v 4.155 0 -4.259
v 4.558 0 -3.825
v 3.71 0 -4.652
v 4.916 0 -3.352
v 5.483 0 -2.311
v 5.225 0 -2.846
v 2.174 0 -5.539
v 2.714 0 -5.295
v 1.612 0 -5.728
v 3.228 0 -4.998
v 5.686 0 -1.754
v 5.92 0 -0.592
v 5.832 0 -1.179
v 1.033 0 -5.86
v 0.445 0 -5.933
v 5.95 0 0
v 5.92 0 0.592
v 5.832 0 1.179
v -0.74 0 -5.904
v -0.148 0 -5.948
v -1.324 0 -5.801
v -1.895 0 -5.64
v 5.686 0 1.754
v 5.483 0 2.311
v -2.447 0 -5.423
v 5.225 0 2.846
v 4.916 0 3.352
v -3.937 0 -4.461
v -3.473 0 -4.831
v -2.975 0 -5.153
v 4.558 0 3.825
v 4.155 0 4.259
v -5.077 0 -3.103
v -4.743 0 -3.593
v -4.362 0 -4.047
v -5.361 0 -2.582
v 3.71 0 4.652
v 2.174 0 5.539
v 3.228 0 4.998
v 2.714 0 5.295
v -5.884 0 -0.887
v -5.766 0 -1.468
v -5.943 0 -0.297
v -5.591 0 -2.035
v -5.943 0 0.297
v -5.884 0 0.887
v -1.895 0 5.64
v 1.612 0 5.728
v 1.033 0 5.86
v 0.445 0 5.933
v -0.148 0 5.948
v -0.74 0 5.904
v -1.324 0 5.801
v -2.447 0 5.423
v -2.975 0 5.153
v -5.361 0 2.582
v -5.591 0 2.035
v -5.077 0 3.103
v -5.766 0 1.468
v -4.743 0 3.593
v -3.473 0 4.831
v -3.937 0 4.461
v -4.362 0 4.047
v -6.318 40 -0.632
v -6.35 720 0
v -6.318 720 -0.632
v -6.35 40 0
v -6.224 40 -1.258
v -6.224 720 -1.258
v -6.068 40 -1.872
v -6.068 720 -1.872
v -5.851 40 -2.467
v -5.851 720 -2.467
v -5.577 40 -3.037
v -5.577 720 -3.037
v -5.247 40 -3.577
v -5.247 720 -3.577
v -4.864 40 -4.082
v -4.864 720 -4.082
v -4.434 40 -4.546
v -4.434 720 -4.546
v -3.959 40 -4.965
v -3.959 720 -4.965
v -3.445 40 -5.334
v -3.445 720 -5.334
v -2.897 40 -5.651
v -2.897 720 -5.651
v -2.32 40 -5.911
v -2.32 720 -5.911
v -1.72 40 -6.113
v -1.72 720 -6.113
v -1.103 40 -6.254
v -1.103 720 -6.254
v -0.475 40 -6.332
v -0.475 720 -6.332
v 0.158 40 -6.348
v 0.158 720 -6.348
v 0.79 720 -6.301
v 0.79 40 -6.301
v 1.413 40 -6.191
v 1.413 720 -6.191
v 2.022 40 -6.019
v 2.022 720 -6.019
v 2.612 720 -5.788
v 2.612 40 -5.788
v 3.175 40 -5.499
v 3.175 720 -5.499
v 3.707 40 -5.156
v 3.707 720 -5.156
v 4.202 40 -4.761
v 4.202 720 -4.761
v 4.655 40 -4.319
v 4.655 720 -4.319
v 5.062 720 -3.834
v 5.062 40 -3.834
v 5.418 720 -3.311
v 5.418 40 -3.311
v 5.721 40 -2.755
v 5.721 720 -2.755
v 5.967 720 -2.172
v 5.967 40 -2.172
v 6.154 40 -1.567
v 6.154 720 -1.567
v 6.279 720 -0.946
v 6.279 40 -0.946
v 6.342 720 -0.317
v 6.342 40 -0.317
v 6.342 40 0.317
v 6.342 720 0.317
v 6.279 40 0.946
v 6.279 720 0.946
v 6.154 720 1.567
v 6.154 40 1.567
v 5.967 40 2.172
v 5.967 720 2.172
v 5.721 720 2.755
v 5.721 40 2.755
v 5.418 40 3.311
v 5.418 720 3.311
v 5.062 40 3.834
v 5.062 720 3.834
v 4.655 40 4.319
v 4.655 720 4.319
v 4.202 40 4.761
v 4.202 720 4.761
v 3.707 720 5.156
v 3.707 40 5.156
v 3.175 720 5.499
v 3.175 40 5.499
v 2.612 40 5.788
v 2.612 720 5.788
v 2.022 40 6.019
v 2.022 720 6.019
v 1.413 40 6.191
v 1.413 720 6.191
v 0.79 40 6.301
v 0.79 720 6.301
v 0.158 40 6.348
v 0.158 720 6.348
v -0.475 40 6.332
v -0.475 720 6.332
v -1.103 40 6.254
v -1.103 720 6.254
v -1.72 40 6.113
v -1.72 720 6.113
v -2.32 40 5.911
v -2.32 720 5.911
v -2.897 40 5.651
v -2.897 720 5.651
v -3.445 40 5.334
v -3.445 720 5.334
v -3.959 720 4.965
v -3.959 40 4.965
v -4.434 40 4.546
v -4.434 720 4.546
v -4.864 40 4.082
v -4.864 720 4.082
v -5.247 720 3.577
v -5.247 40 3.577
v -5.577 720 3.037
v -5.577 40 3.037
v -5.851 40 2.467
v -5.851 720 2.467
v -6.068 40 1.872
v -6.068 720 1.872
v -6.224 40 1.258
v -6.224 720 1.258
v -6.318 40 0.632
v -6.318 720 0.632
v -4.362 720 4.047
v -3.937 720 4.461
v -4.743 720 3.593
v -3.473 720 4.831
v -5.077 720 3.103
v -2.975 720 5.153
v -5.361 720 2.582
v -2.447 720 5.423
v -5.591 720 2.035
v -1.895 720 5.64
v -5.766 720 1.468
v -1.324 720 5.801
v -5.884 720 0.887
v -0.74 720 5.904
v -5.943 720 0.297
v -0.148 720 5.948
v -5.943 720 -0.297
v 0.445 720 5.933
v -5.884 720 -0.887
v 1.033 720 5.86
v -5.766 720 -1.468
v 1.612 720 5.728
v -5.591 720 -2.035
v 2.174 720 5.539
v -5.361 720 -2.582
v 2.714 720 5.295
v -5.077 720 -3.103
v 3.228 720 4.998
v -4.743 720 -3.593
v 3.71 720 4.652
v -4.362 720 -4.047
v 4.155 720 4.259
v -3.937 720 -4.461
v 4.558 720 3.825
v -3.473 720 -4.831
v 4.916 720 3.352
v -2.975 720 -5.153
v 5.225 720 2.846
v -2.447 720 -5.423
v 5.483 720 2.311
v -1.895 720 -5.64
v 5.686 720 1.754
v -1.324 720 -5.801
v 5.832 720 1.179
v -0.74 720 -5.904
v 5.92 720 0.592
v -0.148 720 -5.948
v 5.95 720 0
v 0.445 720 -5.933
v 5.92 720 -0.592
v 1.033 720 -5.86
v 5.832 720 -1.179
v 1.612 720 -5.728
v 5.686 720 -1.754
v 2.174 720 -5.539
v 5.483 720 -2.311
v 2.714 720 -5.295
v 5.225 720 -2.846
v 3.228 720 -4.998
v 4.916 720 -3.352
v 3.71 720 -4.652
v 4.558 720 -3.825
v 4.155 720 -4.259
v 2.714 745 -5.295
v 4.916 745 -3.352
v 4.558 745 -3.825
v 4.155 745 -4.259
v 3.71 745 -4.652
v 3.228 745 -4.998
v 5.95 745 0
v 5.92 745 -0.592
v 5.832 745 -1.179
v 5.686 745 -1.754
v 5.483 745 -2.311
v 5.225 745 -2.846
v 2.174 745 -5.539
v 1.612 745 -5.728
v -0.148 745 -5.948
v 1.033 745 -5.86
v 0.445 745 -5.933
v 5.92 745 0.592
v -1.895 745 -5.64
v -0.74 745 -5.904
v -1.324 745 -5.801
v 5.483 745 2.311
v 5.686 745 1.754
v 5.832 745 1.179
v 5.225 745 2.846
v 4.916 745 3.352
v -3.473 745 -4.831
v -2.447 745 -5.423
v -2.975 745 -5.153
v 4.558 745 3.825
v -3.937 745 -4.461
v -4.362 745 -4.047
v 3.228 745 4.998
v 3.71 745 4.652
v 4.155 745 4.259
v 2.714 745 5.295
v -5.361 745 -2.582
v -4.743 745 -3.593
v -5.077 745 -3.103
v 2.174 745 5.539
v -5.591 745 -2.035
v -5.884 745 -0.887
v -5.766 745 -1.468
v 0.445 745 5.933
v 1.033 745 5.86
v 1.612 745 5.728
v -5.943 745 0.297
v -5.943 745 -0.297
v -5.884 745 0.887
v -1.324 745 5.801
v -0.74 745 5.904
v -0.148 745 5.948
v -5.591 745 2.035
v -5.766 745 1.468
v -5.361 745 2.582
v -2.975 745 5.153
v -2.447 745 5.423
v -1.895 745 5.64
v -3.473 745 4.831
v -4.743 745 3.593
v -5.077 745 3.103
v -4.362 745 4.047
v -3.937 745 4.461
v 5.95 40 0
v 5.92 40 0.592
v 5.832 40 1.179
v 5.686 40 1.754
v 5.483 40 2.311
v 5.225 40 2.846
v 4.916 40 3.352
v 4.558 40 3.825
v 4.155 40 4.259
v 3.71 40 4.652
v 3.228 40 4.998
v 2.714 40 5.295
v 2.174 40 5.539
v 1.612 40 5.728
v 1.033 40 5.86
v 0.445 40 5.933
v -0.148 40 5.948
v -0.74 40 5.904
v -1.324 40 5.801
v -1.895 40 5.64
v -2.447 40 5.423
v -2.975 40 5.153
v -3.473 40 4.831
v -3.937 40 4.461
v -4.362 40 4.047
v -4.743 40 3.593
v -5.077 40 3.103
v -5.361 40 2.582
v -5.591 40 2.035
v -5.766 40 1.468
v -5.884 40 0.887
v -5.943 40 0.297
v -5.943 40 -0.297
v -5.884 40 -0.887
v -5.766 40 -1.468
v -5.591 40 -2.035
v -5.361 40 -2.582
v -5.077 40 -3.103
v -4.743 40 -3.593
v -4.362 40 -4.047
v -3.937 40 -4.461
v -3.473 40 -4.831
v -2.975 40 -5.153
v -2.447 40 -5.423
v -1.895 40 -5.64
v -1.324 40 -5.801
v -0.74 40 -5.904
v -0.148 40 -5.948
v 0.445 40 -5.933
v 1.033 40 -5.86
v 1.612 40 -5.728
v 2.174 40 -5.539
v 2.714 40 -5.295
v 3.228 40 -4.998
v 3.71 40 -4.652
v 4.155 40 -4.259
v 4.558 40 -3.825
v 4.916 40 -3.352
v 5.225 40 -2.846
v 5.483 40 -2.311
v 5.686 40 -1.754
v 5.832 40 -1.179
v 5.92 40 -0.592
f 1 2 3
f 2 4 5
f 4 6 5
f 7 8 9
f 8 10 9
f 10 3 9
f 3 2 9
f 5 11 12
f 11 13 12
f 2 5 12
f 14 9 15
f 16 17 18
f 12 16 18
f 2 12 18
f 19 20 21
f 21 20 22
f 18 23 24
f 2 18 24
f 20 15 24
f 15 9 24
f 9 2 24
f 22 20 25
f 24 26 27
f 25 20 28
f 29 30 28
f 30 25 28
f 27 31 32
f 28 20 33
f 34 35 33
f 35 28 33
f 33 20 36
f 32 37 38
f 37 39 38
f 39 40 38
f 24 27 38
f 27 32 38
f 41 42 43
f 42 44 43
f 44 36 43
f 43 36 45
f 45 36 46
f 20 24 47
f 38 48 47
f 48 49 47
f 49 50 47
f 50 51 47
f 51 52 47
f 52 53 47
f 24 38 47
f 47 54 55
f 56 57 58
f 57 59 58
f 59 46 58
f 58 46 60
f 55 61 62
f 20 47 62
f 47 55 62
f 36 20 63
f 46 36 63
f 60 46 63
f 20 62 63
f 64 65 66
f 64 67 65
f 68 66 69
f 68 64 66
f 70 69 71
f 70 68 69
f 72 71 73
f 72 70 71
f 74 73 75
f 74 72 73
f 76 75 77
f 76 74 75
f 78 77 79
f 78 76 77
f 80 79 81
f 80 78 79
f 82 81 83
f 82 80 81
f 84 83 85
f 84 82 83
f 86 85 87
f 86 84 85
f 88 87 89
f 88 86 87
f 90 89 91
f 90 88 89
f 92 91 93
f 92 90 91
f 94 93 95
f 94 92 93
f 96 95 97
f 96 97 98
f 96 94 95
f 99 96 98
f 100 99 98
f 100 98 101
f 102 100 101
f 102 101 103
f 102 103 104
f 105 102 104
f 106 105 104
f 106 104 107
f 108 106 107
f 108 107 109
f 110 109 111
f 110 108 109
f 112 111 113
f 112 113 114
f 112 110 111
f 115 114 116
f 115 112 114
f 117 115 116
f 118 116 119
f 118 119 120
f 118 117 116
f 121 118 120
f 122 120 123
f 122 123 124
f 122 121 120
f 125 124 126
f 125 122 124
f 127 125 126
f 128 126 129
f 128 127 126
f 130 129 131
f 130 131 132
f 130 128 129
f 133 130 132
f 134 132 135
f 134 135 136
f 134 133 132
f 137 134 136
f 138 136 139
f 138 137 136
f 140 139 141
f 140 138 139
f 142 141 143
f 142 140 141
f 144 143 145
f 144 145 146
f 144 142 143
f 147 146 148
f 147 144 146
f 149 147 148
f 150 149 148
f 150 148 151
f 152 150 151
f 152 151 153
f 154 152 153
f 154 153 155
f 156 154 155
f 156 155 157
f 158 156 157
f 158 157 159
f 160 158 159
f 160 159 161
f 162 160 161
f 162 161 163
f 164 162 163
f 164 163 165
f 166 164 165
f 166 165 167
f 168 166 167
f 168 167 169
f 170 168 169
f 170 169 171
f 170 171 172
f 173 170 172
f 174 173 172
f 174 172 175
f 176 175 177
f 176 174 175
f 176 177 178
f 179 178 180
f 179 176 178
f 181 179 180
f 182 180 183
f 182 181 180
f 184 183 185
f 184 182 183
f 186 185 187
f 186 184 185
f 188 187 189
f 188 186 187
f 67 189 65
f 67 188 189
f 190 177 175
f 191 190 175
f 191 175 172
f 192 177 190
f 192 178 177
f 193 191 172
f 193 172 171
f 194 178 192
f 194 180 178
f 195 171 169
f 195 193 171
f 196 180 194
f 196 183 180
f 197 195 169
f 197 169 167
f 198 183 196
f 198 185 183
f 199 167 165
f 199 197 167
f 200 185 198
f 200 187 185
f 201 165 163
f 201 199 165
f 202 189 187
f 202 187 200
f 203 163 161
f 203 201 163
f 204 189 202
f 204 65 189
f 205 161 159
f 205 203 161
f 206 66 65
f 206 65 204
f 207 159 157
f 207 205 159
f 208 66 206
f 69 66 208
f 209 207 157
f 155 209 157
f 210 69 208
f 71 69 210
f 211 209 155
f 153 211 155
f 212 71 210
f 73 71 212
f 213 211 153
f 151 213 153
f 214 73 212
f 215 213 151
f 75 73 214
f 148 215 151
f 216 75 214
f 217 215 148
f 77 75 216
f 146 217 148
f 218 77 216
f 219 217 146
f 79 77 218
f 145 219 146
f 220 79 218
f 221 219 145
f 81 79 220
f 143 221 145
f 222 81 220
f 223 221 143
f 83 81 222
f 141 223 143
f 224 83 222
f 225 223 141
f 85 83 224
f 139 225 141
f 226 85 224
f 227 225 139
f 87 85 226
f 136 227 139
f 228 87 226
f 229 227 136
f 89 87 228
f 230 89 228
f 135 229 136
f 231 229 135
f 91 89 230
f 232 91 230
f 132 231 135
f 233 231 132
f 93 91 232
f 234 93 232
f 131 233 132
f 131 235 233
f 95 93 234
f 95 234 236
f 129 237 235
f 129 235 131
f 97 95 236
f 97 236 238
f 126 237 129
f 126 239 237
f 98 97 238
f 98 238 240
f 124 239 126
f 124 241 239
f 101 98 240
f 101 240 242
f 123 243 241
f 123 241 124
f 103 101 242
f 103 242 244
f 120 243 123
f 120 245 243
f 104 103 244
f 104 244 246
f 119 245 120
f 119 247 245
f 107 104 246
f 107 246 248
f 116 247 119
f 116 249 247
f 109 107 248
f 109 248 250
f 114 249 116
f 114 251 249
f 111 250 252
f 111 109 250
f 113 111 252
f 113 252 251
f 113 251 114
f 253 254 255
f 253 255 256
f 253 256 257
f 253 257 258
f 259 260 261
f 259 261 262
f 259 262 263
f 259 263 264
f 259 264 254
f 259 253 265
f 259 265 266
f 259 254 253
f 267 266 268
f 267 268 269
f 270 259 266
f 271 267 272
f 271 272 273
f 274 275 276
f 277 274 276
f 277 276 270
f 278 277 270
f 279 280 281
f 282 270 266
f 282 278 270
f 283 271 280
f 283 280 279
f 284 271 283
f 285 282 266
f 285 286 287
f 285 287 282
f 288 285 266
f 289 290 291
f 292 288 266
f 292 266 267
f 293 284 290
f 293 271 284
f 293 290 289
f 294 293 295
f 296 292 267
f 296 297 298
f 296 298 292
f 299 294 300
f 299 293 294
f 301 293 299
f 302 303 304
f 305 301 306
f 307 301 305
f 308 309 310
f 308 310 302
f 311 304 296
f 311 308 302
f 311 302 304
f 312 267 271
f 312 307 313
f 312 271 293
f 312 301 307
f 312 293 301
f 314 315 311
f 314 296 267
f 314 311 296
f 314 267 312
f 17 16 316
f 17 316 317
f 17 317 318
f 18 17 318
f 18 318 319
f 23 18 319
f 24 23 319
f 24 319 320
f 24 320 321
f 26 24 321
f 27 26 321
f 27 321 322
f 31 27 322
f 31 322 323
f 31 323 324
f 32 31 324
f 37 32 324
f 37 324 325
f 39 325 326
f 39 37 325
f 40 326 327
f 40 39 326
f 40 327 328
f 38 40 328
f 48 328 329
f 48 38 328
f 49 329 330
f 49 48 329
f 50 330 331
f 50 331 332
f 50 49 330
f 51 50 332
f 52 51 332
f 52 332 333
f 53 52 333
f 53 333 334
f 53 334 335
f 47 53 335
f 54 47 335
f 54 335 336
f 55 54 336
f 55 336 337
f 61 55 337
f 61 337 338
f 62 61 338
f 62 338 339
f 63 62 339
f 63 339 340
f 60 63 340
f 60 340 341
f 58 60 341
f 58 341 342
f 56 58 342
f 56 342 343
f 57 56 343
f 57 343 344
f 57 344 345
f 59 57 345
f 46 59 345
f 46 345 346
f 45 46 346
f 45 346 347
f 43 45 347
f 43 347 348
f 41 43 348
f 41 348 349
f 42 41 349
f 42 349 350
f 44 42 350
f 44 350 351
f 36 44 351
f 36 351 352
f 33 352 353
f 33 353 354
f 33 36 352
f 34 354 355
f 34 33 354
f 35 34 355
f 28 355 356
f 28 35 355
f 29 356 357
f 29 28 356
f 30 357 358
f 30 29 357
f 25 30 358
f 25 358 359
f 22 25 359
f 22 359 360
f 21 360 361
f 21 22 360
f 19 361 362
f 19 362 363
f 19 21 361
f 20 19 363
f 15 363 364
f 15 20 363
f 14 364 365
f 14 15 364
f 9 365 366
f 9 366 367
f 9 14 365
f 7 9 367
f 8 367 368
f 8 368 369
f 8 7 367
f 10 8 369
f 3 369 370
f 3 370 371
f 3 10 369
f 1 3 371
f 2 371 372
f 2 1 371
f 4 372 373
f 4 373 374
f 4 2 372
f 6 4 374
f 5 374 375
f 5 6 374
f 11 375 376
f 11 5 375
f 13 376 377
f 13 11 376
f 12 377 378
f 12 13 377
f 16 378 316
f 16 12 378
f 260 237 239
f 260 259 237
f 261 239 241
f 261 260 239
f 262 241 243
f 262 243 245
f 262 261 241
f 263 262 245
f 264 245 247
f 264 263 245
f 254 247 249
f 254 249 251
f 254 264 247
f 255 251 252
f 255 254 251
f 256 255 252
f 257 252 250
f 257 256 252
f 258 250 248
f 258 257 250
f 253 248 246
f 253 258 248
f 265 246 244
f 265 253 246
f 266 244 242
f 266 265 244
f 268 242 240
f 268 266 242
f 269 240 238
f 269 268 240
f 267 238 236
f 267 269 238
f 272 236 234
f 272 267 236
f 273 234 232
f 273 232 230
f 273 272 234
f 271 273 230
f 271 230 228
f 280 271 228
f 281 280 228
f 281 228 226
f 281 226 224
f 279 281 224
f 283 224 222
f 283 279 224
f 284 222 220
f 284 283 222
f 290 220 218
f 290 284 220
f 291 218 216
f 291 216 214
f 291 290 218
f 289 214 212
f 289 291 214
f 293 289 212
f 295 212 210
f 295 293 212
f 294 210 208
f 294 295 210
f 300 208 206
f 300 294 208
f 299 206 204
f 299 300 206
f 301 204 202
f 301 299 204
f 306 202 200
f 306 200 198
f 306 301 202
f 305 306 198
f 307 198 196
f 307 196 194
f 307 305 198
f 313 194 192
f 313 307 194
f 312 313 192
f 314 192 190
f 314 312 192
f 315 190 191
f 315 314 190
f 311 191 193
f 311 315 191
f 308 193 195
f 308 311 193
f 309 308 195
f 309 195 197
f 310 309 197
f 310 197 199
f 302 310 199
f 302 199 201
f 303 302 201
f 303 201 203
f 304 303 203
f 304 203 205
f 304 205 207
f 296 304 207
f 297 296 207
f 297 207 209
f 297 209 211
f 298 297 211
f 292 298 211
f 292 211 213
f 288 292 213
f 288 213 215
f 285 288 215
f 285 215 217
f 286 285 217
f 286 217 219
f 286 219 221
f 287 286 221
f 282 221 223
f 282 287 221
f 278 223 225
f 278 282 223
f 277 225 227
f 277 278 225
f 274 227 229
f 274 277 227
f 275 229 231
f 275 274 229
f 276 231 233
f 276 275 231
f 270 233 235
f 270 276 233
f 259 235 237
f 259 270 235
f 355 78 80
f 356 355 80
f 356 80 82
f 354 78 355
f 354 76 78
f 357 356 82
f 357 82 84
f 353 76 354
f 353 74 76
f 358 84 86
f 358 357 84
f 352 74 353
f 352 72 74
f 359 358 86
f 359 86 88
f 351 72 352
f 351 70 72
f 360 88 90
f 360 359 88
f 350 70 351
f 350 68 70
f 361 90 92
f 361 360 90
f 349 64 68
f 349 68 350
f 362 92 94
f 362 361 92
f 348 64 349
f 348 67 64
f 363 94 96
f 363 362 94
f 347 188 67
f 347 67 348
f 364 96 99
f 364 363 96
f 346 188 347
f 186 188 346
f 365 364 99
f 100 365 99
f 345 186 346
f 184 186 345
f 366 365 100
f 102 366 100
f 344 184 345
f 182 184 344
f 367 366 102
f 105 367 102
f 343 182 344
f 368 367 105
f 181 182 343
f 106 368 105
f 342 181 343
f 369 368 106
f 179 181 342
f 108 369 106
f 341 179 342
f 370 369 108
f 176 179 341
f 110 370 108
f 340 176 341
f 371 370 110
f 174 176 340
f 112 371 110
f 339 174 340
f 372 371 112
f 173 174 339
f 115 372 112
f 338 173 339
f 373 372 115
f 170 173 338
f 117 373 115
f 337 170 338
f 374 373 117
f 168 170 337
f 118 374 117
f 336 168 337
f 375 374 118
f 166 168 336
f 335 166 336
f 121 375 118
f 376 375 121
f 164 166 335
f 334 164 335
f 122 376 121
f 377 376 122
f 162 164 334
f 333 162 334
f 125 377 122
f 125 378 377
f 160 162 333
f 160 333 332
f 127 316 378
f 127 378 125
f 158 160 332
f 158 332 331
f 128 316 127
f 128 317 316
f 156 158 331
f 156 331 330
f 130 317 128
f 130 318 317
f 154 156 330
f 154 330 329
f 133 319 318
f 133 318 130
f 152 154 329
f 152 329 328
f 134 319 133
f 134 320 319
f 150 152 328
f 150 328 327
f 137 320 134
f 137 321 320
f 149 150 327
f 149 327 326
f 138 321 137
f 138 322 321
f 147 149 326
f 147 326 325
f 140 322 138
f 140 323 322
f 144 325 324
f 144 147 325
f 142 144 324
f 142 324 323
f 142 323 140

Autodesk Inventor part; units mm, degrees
ref_plane "YZ Plane" through (0, 0, 0) normal (1, 0, 0) x (0, 1, 0)
ref_plane "XZ Plane" through (0, 0, 0) normal (0, 1, 0) x (-1, 0, 0)
ref_plane "XY Plane" through (0, 0, 0) normal (0, 0, 1) x (1, 0, 0)
sketch "Sketch4" plane through (0, 0, 0) normal (0, 1, 0) x (-1, 0, 0)
  circle A0 centre (0, 0) radius 6.35
  dimension "d10" = 12.7
extrude "Extrusion4" add sketch "Sketch4" along normal blind 745
sketch "Sketch5" plane through (0, 745, 0) normal (0, 1, 0) x (1, 0, 0)
  circle A0 centre (0, 0) radius 5.95
  circle A1 centre (0, 0) radius 6.35
  dimension "d13" = 11.9
extrude "Extrusion5" cut sketch "Sketch5" against normal blind 25
sketch "Sketch6" plane through (0, 0, 0) normal (0, -1, 0) x (1, 0, 0)
  circle A0 centre (0, 0) radius 6.35 projected
  circle A1 centre (0, 0) radius 5.95 projected
extrude "Extrusion6" cut sketch "Sketch6" against normal blind 40
properties part number "Eixotrifilado" material "Steel, Alloy"
